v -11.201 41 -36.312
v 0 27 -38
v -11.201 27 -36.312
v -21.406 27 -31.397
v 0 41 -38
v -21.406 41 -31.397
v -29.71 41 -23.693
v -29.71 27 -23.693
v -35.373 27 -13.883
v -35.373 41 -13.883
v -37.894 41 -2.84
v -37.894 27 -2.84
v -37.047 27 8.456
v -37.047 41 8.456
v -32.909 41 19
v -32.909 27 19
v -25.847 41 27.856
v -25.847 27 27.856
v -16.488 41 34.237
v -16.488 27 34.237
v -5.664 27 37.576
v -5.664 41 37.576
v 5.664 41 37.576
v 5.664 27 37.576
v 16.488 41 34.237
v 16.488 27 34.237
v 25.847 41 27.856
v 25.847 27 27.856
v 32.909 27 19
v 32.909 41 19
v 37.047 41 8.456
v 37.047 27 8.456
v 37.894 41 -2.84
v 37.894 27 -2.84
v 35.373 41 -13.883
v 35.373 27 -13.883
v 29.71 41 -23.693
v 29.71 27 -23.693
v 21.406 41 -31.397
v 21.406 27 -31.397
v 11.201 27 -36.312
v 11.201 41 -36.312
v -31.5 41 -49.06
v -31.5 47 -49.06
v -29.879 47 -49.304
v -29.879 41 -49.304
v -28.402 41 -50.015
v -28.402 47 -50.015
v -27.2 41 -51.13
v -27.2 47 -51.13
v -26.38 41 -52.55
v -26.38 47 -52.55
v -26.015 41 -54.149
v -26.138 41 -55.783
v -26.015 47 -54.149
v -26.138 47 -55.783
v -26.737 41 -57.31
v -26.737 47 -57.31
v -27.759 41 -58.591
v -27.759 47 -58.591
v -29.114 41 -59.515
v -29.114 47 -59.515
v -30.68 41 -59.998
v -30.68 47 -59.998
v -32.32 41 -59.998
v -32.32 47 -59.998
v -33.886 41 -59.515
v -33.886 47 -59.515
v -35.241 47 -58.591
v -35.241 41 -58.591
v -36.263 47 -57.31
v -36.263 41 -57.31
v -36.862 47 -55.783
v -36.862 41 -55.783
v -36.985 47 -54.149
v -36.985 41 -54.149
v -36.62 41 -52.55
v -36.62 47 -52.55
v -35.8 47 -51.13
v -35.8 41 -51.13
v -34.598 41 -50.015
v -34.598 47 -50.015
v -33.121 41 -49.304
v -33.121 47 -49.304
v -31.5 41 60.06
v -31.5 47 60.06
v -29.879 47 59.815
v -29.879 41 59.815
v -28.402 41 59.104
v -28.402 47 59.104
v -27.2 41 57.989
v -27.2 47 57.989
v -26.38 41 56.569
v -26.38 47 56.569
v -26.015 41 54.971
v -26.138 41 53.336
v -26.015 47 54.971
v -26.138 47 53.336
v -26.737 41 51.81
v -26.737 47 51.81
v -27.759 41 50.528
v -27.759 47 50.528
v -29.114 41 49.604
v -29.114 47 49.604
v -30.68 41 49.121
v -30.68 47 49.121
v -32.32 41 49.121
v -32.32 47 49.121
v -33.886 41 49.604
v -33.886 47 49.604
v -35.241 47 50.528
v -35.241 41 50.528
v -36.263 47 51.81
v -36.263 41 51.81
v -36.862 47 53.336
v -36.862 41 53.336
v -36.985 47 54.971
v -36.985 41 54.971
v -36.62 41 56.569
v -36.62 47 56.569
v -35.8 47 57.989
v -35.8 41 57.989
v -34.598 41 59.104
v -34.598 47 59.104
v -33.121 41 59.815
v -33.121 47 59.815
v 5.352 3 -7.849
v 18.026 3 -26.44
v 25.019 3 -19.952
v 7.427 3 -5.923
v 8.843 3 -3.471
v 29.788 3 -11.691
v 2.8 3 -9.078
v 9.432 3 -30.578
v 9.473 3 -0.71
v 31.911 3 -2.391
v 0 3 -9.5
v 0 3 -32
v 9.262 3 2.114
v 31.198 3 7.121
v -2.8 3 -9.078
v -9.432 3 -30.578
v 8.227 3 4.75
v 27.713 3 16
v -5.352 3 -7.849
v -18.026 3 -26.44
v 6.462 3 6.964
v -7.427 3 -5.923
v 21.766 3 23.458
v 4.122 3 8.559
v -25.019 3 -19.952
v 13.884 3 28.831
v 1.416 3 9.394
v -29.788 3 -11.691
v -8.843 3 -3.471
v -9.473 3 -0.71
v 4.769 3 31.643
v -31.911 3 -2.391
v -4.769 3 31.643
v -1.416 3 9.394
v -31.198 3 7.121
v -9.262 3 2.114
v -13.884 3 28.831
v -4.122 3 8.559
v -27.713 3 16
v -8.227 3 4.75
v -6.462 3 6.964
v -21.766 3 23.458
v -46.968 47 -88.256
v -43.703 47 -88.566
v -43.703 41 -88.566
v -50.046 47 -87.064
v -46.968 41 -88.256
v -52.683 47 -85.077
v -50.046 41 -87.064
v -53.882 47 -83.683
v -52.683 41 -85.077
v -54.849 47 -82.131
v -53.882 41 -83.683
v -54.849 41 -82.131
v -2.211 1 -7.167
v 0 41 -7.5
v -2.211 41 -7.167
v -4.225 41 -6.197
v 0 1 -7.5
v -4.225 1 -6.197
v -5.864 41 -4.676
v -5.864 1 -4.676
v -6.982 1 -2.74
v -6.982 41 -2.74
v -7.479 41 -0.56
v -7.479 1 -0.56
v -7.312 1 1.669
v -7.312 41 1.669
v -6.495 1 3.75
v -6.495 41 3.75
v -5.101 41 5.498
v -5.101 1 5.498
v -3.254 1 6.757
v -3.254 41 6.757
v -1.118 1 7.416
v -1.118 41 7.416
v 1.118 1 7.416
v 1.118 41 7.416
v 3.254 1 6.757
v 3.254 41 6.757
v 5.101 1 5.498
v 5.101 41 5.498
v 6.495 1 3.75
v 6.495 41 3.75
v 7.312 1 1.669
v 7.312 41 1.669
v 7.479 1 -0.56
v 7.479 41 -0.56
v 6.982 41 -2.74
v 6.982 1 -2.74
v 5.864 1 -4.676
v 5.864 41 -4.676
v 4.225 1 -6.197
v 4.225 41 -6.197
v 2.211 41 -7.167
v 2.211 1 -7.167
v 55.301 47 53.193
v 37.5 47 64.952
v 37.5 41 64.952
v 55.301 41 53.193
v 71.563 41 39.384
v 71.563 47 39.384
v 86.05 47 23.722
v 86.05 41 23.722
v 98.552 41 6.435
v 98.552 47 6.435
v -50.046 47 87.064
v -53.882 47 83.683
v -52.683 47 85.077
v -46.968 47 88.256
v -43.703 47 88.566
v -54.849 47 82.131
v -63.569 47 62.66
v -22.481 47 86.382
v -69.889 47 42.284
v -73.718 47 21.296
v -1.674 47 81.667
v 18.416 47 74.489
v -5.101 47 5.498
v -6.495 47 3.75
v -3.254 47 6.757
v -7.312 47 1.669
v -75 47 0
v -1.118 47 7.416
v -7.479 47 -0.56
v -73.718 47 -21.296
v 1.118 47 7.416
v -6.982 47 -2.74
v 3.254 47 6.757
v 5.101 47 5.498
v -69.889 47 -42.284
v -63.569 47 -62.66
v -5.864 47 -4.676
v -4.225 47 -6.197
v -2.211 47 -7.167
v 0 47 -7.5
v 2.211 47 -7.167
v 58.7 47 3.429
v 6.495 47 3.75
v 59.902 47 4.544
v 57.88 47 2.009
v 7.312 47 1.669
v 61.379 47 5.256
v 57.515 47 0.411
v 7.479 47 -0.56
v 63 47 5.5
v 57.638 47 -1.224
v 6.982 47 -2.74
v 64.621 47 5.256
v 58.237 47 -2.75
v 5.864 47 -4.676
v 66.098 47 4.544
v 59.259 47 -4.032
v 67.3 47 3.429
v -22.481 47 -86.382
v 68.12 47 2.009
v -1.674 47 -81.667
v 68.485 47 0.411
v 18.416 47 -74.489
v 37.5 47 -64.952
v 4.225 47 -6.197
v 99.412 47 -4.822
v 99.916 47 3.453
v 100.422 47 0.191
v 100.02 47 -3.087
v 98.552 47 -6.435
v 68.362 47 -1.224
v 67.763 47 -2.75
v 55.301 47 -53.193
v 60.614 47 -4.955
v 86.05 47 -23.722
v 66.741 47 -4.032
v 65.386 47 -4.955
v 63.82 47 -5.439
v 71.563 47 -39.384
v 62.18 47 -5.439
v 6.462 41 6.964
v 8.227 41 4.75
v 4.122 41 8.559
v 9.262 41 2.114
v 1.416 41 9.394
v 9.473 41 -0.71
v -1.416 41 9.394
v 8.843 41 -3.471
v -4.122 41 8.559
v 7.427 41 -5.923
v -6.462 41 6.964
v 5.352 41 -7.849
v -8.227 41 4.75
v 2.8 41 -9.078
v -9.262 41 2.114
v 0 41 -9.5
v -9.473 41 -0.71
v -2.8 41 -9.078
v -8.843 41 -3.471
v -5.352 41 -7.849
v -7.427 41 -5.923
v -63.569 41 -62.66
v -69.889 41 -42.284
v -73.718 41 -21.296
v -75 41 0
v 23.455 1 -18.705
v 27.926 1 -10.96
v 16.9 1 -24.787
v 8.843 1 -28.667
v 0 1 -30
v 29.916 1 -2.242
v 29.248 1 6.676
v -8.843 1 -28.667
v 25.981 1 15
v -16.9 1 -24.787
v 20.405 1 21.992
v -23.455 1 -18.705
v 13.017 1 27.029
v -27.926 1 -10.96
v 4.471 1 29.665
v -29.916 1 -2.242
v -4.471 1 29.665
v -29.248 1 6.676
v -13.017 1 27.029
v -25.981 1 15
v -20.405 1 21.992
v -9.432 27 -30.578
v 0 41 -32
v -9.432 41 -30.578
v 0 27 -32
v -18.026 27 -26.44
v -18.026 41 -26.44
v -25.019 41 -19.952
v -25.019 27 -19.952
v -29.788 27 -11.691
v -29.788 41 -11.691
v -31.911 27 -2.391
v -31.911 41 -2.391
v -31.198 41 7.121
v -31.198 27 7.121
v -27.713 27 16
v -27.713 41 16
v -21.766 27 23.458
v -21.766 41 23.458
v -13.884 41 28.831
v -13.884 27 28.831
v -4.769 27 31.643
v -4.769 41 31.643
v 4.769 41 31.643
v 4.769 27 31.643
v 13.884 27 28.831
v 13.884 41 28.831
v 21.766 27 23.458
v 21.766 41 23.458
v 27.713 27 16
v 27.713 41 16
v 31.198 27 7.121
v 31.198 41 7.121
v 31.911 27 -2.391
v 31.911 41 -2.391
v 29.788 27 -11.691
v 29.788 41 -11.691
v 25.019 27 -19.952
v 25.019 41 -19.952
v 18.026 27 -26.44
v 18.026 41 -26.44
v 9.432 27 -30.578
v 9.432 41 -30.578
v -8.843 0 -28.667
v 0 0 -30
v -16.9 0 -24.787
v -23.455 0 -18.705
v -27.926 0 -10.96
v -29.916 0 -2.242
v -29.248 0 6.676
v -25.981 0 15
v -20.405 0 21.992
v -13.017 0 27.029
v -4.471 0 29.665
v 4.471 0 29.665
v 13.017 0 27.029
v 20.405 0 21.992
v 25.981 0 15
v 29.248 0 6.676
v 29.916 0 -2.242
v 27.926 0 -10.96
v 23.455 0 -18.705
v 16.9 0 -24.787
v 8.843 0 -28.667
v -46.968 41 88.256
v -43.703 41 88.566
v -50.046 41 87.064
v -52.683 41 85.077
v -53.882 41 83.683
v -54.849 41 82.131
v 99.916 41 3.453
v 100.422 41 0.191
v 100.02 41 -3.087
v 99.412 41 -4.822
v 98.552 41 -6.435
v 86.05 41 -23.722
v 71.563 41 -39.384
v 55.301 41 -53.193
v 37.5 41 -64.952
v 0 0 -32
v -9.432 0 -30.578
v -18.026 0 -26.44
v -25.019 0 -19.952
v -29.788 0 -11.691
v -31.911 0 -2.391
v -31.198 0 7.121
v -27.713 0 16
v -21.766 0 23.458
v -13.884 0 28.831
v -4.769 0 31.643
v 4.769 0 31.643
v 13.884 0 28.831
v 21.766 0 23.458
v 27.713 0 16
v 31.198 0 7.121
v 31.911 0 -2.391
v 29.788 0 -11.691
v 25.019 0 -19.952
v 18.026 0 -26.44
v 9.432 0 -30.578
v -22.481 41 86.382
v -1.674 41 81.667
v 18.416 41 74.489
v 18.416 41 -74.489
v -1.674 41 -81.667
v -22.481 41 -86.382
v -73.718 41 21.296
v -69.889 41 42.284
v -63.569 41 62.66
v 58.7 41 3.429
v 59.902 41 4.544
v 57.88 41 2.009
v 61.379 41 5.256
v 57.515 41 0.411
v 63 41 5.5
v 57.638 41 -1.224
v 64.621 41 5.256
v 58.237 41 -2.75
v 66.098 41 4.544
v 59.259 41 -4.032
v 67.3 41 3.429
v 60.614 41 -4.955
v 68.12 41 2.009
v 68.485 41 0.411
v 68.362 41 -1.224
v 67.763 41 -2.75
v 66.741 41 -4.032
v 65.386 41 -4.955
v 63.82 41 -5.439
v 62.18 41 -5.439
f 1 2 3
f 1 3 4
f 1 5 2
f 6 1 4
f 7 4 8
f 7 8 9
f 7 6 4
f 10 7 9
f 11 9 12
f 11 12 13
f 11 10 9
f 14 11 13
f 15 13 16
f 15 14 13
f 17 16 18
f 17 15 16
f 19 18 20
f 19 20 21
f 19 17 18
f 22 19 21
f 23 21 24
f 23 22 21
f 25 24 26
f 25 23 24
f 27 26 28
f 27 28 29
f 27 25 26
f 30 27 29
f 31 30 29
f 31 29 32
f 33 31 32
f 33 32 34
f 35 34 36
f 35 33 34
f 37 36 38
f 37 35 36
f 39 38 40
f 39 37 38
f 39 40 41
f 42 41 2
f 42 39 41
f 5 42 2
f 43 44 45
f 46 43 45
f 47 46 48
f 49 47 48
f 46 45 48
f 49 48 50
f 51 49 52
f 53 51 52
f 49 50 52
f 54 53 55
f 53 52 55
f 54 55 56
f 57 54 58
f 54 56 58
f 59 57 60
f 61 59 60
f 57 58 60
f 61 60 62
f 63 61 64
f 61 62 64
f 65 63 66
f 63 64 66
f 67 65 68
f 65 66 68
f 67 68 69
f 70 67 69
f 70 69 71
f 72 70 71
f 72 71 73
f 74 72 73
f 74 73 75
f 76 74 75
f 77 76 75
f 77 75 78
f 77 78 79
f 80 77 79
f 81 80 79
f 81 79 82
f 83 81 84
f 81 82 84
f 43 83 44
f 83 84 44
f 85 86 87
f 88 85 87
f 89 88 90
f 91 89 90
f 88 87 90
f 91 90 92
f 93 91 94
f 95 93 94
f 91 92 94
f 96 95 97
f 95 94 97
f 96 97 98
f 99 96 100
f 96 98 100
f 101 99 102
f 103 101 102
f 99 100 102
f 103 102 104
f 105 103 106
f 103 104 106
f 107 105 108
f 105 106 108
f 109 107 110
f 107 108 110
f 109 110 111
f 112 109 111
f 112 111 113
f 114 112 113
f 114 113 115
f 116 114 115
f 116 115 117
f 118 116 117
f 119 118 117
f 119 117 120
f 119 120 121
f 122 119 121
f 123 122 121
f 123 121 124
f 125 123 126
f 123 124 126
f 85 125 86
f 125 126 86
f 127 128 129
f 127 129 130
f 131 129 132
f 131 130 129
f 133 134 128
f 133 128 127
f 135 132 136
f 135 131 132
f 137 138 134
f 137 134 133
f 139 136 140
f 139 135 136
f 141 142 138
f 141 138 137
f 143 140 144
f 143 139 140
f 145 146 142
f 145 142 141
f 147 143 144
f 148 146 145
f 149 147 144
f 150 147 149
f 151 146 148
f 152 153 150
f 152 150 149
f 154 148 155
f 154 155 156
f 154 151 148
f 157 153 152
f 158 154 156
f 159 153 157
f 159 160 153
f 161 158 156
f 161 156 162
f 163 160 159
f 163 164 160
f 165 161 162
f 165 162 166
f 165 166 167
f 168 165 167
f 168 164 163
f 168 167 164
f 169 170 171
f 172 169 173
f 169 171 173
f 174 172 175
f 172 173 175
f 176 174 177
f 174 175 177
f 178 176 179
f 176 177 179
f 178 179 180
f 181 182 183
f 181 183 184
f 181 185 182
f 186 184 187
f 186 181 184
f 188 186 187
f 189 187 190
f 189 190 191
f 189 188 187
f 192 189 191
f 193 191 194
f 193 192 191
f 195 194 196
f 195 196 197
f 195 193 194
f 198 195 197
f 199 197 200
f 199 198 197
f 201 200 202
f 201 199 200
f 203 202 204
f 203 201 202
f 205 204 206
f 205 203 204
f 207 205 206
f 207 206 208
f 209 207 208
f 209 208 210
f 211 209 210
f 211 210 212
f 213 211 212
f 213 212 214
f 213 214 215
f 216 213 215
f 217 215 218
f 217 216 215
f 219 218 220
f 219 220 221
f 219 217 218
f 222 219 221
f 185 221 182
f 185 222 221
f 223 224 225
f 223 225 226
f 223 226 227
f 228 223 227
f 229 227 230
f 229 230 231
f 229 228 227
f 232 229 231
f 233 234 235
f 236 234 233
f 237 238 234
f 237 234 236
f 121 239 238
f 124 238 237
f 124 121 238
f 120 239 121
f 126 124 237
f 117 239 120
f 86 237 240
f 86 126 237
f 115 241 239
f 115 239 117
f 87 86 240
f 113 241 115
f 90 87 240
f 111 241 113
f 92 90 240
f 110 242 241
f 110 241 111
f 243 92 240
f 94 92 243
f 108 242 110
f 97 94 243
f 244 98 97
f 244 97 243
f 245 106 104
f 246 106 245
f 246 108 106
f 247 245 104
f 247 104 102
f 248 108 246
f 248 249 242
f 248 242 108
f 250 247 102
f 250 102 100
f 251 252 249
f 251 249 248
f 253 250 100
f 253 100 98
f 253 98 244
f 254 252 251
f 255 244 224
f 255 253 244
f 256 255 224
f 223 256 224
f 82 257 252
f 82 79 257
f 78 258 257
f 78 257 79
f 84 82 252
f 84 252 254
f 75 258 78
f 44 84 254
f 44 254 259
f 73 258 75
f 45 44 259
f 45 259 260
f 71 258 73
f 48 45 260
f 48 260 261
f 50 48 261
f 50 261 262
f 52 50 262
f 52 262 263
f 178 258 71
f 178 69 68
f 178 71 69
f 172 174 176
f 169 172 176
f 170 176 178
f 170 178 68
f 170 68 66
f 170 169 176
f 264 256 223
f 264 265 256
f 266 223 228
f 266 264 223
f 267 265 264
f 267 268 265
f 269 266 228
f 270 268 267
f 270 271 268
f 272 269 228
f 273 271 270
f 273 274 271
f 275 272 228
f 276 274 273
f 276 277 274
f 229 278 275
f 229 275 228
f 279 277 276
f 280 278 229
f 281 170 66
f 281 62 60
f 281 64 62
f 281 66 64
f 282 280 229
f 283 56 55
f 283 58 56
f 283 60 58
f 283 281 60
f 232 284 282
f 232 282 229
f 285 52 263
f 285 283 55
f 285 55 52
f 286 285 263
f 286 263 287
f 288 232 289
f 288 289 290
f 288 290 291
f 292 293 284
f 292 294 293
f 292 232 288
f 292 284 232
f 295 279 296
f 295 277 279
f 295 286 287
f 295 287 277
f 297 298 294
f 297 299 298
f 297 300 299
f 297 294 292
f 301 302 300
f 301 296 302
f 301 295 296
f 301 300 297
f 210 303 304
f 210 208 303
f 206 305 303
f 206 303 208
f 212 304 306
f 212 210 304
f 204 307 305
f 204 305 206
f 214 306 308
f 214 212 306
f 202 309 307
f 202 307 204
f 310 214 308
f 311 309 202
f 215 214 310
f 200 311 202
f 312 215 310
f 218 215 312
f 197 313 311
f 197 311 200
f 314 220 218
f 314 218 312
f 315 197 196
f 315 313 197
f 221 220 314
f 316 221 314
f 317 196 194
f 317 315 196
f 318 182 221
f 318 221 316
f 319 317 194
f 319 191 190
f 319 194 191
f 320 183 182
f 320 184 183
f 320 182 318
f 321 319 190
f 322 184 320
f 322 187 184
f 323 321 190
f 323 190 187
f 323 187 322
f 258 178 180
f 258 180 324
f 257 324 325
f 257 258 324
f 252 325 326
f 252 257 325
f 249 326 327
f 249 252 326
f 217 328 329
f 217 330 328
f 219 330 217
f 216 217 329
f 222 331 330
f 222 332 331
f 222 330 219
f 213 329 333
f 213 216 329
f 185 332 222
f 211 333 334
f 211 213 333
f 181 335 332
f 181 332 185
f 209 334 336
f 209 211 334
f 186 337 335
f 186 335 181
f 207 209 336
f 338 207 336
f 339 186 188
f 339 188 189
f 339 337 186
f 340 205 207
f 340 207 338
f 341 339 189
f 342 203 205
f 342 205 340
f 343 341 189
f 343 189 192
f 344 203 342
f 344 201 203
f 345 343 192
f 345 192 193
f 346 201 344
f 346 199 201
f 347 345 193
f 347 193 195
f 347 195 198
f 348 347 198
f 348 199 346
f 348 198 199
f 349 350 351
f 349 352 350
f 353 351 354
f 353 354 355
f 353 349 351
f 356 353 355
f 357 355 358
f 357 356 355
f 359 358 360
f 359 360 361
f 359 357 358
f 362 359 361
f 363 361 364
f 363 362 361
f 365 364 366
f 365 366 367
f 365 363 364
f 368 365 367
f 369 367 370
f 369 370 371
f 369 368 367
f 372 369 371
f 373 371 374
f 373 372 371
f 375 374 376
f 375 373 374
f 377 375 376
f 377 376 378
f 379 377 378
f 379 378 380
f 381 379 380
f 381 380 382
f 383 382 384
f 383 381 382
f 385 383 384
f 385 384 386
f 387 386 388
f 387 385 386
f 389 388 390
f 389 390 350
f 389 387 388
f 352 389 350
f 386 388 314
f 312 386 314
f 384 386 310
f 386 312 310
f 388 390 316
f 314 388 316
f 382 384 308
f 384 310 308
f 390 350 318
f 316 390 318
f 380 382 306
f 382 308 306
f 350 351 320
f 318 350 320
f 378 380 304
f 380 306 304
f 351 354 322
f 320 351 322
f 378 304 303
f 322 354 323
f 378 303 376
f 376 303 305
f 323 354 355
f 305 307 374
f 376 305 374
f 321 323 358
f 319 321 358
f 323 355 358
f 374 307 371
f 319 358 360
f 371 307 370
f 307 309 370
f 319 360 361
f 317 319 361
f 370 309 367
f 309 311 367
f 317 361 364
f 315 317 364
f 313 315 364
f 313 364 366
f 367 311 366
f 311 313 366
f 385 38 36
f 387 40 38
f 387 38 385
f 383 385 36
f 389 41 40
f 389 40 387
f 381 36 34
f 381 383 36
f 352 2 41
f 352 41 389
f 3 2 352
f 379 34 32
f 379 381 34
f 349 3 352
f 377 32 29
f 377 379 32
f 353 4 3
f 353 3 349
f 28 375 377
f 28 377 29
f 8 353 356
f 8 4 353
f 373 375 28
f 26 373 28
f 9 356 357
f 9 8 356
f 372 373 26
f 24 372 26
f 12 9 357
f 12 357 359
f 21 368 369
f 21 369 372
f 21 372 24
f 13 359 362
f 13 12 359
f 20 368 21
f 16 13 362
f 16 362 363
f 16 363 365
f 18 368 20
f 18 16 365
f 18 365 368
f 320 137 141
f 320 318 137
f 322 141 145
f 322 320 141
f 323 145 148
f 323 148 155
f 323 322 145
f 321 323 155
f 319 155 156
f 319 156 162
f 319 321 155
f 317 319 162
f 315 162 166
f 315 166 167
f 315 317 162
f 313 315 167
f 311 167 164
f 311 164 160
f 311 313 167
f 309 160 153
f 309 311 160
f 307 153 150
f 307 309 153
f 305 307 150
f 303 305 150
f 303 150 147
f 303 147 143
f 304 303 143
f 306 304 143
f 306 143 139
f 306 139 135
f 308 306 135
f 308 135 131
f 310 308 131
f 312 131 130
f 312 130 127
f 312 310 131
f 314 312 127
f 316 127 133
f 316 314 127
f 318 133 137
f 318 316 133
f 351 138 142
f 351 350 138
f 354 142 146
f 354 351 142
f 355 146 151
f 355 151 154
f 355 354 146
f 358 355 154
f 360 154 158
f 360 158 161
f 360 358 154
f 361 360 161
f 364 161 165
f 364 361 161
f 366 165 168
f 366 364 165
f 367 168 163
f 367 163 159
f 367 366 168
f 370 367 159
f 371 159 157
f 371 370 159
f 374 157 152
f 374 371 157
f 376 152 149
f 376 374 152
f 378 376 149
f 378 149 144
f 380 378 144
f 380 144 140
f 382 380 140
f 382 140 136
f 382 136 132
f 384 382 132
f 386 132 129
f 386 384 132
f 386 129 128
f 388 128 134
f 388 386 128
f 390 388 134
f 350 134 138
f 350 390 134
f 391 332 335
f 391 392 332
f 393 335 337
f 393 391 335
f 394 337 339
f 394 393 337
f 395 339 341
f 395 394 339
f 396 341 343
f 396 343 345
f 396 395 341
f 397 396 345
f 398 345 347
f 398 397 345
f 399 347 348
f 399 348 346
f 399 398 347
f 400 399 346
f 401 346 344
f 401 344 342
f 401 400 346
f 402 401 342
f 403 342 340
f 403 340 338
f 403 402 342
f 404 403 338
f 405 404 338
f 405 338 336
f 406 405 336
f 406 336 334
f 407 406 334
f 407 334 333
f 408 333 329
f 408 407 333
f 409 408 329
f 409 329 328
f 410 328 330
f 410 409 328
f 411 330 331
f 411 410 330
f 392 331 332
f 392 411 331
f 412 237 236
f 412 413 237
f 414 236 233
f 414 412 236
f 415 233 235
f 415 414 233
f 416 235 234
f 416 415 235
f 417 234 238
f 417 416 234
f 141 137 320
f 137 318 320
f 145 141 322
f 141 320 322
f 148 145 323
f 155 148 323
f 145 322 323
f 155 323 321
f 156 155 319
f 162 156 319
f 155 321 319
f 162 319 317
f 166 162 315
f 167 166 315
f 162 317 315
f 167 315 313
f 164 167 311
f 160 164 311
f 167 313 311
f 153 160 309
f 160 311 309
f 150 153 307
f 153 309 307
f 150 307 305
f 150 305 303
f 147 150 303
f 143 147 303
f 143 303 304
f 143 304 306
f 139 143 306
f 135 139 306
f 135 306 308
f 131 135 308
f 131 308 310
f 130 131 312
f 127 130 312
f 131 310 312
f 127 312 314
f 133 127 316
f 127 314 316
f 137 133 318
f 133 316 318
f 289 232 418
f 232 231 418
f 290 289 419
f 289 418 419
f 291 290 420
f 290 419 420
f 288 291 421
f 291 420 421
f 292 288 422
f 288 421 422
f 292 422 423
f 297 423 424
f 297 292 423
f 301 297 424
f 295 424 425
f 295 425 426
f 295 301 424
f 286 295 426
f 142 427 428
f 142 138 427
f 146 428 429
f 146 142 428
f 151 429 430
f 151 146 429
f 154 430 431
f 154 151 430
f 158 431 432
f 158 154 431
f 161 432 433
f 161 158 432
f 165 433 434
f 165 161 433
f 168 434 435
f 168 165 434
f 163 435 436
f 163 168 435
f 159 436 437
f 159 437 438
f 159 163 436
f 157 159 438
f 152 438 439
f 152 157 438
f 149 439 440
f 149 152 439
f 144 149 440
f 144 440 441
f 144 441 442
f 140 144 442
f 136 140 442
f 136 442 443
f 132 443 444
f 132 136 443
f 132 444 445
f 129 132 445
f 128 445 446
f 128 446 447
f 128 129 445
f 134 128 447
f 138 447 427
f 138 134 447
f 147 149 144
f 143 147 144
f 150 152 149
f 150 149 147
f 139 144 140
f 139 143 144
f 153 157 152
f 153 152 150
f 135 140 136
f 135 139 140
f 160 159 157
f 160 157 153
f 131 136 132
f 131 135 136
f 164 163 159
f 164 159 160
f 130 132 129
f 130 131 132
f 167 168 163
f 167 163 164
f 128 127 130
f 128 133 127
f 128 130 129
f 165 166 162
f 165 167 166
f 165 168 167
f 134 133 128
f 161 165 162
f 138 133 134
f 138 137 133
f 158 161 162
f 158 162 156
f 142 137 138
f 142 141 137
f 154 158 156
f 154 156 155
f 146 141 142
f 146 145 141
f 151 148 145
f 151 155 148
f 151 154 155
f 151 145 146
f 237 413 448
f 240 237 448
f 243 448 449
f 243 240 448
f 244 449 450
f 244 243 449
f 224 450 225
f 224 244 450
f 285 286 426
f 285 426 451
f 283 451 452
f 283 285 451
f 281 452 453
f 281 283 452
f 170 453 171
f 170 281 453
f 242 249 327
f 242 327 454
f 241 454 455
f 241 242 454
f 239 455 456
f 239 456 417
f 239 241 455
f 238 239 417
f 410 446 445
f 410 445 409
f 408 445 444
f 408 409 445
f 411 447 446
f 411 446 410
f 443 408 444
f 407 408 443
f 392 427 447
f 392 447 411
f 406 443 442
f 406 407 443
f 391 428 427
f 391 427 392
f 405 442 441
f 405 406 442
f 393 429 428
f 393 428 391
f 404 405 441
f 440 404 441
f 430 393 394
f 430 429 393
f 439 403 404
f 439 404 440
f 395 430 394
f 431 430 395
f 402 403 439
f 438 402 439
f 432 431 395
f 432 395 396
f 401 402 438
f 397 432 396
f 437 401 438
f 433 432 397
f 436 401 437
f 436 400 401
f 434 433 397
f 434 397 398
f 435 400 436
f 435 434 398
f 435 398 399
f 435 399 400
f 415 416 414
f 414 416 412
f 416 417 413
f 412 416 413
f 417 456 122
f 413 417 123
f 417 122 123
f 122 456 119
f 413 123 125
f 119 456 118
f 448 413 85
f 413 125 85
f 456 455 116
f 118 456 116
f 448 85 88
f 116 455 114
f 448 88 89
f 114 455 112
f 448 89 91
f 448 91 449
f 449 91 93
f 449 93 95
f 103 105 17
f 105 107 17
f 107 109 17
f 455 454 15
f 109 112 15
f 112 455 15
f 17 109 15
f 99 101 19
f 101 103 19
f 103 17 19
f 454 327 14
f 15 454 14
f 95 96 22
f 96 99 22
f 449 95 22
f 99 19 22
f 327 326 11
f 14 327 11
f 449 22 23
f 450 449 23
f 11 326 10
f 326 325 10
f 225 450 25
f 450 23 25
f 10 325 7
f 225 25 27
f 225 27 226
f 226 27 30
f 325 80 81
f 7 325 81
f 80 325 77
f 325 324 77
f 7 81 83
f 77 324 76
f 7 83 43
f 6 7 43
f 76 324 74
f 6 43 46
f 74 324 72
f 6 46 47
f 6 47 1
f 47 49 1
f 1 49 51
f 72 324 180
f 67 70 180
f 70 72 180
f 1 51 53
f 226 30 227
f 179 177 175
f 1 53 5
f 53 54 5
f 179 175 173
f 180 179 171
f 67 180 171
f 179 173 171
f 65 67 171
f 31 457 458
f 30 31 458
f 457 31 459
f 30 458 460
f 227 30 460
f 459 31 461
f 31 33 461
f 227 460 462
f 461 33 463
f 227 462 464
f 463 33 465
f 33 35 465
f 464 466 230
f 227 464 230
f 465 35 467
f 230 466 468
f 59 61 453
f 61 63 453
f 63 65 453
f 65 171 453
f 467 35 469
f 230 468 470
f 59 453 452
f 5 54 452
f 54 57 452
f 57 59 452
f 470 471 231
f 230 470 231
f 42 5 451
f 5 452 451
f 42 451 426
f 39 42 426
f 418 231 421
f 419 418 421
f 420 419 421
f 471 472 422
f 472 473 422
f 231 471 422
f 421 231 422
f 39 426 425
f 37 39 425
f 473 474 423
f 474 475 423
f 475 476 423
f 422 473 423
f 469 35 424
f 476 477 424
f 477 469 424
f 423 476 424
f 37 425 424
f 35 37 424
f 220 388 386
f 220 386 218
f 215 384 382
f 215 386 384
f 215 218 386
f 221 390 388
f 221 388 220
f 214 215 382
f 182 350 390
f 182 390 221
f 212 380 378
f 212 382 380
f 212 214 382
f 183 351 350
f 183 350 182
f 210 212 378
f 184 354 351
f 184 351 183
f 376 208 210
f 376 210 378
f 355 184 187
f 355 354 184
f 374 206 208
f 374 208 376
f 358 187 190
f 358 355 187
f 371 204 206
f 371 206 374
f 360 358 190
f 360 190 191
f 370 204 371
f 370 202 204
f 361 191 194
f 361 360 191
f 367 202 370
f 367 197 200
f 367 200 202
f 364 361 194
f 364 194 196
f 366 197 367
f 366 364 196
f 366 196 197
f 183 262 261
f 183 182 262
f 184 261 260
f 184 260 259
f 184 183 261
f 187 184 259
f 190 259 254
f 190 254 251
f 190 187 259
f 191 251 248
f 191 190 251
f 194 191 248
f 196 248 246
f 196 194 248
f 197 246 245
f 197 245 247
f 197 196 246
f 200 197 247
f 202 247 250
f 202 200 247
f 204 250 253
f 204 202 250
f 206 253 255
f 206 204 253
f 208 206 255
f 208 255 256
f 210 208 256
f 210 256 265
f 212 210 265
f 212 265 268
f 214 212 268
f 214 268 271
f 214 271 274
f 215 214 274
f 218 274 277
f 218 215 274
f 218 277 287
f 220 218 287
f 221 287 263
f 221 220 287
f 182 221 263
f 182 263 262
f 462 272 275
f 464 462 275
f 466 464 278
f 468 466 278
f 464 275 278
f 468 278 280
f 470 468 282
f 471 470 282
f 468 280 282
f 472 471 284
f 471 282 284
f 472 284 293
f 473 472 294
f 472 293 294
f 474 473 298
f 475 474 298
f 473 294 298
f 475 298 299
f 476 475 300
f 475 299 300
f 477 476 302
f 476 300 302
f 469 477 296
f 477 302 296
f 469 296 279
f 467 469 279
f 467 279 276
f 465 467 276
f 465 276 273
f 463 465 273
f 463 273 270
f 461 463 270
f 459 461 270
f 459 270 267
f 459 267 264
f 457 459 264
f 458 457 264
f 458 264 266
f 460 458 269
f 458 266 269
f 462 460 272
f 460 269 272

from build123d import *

# Parameters (mm, degrees)
SKETCH_3_W          = 22.5
SKETCH_3_H          = 38
EXTRUDE_1_DEPTH     = 6
SKETCH_6_R          = 5.5
CUT_EXTRUDE_1_DEPTH = 6
FILLET_1_R          = 12


with BuildPart() as part:
    # 草图2 → 旋转1 (revolve)
    with BuildSketch(Plane.XY, mode=Mode.PRIVATE) as revolve_1_sk:
        Polygon((30, 0), (32, 0), (32, 3), (9.5, 3), (9.5, 41), (7.5, 41), (7.5, 1), (30, 1), align=None)
    revolve(revolve_1_sk.sketch.rotate(Axis((0, 0, 0), (0, 1, 0)), 90), axis=Axis((0, 0, 0), (0, 1, 0)))


with BuildPart() as body_2:
    # 草图3 → 旋转2 (revolve)
    with BuildSketch(Plane.XY, mode=Mode.PRIVATE) as revolve_2_sk:
        with Locations((20.75, 22)):
            Rectangle(SKETCH_3_W, SKETCH_3_H)
    revolve(revolve_2_sk.sketch.rotate(Axis((0, 0, 0), (0, 1, 0)), 90), axis=Axis((0, 0, 0), (0, 1, 0)))


with BuildPart() as body_3:
    # 草图4 → 旋转3 (revolve)
    with BuildSketch(Plane.XY, mode=Mode.PRIVATE) as revolve_3_sk:
        Polygon((32, 41), (32, 27), (38, 27), (38, 41), (75, 41), (75, 47), (32, 47), (7.5, 47), (7.5, 41), align=None)
    revolve(revolve_3_sk.sketch.rotate(Axis((0, 0, 0), (0, 1, 0)), 90), axis=Axis((0, 0, 0), (0, 1, 0)))

    # 草图5 → 凸台-拉伸1 (add)
    with BuildSketch(Plane(origin=(0, 47, 0), x_dir=(1, 0, 0), z_dir=(0, 1, 0))):
        with BuildLine():
            ThreePointArc((37.499997067, 64.951906977), (75, 4.86e-07), (37.499997908, -64.951906491))
            ThreePointArc((37.499997908, -64.951906491), (74.251492065, -36.751493773), (102.451905284, 0))
            ThreePointArc((102.451905284, 0), (74.251491722, 36.751494116), (37.499997067, 64.951906977))
        make_face()
        with BuildLine():
            ThreePointArc((-75, 0), (-37.500001466, 64.951904437), (37.499997067, 64.951906977))
            ThreePointArc((37.499997067, 64.951906977), (-5.2980216, 82.679426034), (-51.225952642, 88.725952642))
            ThreePointArc((-51.225952642, 88.725952642), (-68.953472954, 45.927932677), (-75, 0))
        make_face()
        with BuildLine():
            ThreePointArc((-51.225952642, -88.725952642), (-5.298021131, -82.679425908), (37.499997908, -64.951906491))
            ThreePointArc((37.499997908, -64.951906491), (-37.500001046, -64.95190468), (-75, 0))
            ThreePointArc((-75, 0), (-68.953472954, -45.927932677), (-51.225952642, -88.725952642))
        make_face()
    extrude(amount=-EXTRUDE_1_DEPTH)

    # 草图6 → 切除-拉伸1 (cut)
    with BuildSketch(Plane(origin=(0, 47, 0), x_dir=(1, 0, 0), z_dir=(0, 1, 0))):
        with Locations(Location((-31.5, 54.559600438, 0), (0, 0, 270))):
            Circle(SKETCH_6_R)
        with Locations(Location((-31.5, -54.559600438, 0), (0, 0, 270))):
            Circle(SKETCH_6_R)
        with Locations(Location((63, 0, 0), (0, 0, 270))):
            Circle(SKETCH_6_R)
    extrude(amount=-CUT_EXTRUDE_1_DEPTH, mode=Mode.SUBTRACT)

    # 圆角1
    fillet_1_edges = [body_3.edges().sort_by_distance(p)[0] for p in [
        (-51.225952642, 44, -88.725952642),
        (-51.225952642, 44, 88.725952642),
        (102.451905284, 44, 0),
    ]]
    fillet(fillet_1_edges, radius=FILLET_1_R)


solid = Compound([part.part, body_2.part, body_3.part])
